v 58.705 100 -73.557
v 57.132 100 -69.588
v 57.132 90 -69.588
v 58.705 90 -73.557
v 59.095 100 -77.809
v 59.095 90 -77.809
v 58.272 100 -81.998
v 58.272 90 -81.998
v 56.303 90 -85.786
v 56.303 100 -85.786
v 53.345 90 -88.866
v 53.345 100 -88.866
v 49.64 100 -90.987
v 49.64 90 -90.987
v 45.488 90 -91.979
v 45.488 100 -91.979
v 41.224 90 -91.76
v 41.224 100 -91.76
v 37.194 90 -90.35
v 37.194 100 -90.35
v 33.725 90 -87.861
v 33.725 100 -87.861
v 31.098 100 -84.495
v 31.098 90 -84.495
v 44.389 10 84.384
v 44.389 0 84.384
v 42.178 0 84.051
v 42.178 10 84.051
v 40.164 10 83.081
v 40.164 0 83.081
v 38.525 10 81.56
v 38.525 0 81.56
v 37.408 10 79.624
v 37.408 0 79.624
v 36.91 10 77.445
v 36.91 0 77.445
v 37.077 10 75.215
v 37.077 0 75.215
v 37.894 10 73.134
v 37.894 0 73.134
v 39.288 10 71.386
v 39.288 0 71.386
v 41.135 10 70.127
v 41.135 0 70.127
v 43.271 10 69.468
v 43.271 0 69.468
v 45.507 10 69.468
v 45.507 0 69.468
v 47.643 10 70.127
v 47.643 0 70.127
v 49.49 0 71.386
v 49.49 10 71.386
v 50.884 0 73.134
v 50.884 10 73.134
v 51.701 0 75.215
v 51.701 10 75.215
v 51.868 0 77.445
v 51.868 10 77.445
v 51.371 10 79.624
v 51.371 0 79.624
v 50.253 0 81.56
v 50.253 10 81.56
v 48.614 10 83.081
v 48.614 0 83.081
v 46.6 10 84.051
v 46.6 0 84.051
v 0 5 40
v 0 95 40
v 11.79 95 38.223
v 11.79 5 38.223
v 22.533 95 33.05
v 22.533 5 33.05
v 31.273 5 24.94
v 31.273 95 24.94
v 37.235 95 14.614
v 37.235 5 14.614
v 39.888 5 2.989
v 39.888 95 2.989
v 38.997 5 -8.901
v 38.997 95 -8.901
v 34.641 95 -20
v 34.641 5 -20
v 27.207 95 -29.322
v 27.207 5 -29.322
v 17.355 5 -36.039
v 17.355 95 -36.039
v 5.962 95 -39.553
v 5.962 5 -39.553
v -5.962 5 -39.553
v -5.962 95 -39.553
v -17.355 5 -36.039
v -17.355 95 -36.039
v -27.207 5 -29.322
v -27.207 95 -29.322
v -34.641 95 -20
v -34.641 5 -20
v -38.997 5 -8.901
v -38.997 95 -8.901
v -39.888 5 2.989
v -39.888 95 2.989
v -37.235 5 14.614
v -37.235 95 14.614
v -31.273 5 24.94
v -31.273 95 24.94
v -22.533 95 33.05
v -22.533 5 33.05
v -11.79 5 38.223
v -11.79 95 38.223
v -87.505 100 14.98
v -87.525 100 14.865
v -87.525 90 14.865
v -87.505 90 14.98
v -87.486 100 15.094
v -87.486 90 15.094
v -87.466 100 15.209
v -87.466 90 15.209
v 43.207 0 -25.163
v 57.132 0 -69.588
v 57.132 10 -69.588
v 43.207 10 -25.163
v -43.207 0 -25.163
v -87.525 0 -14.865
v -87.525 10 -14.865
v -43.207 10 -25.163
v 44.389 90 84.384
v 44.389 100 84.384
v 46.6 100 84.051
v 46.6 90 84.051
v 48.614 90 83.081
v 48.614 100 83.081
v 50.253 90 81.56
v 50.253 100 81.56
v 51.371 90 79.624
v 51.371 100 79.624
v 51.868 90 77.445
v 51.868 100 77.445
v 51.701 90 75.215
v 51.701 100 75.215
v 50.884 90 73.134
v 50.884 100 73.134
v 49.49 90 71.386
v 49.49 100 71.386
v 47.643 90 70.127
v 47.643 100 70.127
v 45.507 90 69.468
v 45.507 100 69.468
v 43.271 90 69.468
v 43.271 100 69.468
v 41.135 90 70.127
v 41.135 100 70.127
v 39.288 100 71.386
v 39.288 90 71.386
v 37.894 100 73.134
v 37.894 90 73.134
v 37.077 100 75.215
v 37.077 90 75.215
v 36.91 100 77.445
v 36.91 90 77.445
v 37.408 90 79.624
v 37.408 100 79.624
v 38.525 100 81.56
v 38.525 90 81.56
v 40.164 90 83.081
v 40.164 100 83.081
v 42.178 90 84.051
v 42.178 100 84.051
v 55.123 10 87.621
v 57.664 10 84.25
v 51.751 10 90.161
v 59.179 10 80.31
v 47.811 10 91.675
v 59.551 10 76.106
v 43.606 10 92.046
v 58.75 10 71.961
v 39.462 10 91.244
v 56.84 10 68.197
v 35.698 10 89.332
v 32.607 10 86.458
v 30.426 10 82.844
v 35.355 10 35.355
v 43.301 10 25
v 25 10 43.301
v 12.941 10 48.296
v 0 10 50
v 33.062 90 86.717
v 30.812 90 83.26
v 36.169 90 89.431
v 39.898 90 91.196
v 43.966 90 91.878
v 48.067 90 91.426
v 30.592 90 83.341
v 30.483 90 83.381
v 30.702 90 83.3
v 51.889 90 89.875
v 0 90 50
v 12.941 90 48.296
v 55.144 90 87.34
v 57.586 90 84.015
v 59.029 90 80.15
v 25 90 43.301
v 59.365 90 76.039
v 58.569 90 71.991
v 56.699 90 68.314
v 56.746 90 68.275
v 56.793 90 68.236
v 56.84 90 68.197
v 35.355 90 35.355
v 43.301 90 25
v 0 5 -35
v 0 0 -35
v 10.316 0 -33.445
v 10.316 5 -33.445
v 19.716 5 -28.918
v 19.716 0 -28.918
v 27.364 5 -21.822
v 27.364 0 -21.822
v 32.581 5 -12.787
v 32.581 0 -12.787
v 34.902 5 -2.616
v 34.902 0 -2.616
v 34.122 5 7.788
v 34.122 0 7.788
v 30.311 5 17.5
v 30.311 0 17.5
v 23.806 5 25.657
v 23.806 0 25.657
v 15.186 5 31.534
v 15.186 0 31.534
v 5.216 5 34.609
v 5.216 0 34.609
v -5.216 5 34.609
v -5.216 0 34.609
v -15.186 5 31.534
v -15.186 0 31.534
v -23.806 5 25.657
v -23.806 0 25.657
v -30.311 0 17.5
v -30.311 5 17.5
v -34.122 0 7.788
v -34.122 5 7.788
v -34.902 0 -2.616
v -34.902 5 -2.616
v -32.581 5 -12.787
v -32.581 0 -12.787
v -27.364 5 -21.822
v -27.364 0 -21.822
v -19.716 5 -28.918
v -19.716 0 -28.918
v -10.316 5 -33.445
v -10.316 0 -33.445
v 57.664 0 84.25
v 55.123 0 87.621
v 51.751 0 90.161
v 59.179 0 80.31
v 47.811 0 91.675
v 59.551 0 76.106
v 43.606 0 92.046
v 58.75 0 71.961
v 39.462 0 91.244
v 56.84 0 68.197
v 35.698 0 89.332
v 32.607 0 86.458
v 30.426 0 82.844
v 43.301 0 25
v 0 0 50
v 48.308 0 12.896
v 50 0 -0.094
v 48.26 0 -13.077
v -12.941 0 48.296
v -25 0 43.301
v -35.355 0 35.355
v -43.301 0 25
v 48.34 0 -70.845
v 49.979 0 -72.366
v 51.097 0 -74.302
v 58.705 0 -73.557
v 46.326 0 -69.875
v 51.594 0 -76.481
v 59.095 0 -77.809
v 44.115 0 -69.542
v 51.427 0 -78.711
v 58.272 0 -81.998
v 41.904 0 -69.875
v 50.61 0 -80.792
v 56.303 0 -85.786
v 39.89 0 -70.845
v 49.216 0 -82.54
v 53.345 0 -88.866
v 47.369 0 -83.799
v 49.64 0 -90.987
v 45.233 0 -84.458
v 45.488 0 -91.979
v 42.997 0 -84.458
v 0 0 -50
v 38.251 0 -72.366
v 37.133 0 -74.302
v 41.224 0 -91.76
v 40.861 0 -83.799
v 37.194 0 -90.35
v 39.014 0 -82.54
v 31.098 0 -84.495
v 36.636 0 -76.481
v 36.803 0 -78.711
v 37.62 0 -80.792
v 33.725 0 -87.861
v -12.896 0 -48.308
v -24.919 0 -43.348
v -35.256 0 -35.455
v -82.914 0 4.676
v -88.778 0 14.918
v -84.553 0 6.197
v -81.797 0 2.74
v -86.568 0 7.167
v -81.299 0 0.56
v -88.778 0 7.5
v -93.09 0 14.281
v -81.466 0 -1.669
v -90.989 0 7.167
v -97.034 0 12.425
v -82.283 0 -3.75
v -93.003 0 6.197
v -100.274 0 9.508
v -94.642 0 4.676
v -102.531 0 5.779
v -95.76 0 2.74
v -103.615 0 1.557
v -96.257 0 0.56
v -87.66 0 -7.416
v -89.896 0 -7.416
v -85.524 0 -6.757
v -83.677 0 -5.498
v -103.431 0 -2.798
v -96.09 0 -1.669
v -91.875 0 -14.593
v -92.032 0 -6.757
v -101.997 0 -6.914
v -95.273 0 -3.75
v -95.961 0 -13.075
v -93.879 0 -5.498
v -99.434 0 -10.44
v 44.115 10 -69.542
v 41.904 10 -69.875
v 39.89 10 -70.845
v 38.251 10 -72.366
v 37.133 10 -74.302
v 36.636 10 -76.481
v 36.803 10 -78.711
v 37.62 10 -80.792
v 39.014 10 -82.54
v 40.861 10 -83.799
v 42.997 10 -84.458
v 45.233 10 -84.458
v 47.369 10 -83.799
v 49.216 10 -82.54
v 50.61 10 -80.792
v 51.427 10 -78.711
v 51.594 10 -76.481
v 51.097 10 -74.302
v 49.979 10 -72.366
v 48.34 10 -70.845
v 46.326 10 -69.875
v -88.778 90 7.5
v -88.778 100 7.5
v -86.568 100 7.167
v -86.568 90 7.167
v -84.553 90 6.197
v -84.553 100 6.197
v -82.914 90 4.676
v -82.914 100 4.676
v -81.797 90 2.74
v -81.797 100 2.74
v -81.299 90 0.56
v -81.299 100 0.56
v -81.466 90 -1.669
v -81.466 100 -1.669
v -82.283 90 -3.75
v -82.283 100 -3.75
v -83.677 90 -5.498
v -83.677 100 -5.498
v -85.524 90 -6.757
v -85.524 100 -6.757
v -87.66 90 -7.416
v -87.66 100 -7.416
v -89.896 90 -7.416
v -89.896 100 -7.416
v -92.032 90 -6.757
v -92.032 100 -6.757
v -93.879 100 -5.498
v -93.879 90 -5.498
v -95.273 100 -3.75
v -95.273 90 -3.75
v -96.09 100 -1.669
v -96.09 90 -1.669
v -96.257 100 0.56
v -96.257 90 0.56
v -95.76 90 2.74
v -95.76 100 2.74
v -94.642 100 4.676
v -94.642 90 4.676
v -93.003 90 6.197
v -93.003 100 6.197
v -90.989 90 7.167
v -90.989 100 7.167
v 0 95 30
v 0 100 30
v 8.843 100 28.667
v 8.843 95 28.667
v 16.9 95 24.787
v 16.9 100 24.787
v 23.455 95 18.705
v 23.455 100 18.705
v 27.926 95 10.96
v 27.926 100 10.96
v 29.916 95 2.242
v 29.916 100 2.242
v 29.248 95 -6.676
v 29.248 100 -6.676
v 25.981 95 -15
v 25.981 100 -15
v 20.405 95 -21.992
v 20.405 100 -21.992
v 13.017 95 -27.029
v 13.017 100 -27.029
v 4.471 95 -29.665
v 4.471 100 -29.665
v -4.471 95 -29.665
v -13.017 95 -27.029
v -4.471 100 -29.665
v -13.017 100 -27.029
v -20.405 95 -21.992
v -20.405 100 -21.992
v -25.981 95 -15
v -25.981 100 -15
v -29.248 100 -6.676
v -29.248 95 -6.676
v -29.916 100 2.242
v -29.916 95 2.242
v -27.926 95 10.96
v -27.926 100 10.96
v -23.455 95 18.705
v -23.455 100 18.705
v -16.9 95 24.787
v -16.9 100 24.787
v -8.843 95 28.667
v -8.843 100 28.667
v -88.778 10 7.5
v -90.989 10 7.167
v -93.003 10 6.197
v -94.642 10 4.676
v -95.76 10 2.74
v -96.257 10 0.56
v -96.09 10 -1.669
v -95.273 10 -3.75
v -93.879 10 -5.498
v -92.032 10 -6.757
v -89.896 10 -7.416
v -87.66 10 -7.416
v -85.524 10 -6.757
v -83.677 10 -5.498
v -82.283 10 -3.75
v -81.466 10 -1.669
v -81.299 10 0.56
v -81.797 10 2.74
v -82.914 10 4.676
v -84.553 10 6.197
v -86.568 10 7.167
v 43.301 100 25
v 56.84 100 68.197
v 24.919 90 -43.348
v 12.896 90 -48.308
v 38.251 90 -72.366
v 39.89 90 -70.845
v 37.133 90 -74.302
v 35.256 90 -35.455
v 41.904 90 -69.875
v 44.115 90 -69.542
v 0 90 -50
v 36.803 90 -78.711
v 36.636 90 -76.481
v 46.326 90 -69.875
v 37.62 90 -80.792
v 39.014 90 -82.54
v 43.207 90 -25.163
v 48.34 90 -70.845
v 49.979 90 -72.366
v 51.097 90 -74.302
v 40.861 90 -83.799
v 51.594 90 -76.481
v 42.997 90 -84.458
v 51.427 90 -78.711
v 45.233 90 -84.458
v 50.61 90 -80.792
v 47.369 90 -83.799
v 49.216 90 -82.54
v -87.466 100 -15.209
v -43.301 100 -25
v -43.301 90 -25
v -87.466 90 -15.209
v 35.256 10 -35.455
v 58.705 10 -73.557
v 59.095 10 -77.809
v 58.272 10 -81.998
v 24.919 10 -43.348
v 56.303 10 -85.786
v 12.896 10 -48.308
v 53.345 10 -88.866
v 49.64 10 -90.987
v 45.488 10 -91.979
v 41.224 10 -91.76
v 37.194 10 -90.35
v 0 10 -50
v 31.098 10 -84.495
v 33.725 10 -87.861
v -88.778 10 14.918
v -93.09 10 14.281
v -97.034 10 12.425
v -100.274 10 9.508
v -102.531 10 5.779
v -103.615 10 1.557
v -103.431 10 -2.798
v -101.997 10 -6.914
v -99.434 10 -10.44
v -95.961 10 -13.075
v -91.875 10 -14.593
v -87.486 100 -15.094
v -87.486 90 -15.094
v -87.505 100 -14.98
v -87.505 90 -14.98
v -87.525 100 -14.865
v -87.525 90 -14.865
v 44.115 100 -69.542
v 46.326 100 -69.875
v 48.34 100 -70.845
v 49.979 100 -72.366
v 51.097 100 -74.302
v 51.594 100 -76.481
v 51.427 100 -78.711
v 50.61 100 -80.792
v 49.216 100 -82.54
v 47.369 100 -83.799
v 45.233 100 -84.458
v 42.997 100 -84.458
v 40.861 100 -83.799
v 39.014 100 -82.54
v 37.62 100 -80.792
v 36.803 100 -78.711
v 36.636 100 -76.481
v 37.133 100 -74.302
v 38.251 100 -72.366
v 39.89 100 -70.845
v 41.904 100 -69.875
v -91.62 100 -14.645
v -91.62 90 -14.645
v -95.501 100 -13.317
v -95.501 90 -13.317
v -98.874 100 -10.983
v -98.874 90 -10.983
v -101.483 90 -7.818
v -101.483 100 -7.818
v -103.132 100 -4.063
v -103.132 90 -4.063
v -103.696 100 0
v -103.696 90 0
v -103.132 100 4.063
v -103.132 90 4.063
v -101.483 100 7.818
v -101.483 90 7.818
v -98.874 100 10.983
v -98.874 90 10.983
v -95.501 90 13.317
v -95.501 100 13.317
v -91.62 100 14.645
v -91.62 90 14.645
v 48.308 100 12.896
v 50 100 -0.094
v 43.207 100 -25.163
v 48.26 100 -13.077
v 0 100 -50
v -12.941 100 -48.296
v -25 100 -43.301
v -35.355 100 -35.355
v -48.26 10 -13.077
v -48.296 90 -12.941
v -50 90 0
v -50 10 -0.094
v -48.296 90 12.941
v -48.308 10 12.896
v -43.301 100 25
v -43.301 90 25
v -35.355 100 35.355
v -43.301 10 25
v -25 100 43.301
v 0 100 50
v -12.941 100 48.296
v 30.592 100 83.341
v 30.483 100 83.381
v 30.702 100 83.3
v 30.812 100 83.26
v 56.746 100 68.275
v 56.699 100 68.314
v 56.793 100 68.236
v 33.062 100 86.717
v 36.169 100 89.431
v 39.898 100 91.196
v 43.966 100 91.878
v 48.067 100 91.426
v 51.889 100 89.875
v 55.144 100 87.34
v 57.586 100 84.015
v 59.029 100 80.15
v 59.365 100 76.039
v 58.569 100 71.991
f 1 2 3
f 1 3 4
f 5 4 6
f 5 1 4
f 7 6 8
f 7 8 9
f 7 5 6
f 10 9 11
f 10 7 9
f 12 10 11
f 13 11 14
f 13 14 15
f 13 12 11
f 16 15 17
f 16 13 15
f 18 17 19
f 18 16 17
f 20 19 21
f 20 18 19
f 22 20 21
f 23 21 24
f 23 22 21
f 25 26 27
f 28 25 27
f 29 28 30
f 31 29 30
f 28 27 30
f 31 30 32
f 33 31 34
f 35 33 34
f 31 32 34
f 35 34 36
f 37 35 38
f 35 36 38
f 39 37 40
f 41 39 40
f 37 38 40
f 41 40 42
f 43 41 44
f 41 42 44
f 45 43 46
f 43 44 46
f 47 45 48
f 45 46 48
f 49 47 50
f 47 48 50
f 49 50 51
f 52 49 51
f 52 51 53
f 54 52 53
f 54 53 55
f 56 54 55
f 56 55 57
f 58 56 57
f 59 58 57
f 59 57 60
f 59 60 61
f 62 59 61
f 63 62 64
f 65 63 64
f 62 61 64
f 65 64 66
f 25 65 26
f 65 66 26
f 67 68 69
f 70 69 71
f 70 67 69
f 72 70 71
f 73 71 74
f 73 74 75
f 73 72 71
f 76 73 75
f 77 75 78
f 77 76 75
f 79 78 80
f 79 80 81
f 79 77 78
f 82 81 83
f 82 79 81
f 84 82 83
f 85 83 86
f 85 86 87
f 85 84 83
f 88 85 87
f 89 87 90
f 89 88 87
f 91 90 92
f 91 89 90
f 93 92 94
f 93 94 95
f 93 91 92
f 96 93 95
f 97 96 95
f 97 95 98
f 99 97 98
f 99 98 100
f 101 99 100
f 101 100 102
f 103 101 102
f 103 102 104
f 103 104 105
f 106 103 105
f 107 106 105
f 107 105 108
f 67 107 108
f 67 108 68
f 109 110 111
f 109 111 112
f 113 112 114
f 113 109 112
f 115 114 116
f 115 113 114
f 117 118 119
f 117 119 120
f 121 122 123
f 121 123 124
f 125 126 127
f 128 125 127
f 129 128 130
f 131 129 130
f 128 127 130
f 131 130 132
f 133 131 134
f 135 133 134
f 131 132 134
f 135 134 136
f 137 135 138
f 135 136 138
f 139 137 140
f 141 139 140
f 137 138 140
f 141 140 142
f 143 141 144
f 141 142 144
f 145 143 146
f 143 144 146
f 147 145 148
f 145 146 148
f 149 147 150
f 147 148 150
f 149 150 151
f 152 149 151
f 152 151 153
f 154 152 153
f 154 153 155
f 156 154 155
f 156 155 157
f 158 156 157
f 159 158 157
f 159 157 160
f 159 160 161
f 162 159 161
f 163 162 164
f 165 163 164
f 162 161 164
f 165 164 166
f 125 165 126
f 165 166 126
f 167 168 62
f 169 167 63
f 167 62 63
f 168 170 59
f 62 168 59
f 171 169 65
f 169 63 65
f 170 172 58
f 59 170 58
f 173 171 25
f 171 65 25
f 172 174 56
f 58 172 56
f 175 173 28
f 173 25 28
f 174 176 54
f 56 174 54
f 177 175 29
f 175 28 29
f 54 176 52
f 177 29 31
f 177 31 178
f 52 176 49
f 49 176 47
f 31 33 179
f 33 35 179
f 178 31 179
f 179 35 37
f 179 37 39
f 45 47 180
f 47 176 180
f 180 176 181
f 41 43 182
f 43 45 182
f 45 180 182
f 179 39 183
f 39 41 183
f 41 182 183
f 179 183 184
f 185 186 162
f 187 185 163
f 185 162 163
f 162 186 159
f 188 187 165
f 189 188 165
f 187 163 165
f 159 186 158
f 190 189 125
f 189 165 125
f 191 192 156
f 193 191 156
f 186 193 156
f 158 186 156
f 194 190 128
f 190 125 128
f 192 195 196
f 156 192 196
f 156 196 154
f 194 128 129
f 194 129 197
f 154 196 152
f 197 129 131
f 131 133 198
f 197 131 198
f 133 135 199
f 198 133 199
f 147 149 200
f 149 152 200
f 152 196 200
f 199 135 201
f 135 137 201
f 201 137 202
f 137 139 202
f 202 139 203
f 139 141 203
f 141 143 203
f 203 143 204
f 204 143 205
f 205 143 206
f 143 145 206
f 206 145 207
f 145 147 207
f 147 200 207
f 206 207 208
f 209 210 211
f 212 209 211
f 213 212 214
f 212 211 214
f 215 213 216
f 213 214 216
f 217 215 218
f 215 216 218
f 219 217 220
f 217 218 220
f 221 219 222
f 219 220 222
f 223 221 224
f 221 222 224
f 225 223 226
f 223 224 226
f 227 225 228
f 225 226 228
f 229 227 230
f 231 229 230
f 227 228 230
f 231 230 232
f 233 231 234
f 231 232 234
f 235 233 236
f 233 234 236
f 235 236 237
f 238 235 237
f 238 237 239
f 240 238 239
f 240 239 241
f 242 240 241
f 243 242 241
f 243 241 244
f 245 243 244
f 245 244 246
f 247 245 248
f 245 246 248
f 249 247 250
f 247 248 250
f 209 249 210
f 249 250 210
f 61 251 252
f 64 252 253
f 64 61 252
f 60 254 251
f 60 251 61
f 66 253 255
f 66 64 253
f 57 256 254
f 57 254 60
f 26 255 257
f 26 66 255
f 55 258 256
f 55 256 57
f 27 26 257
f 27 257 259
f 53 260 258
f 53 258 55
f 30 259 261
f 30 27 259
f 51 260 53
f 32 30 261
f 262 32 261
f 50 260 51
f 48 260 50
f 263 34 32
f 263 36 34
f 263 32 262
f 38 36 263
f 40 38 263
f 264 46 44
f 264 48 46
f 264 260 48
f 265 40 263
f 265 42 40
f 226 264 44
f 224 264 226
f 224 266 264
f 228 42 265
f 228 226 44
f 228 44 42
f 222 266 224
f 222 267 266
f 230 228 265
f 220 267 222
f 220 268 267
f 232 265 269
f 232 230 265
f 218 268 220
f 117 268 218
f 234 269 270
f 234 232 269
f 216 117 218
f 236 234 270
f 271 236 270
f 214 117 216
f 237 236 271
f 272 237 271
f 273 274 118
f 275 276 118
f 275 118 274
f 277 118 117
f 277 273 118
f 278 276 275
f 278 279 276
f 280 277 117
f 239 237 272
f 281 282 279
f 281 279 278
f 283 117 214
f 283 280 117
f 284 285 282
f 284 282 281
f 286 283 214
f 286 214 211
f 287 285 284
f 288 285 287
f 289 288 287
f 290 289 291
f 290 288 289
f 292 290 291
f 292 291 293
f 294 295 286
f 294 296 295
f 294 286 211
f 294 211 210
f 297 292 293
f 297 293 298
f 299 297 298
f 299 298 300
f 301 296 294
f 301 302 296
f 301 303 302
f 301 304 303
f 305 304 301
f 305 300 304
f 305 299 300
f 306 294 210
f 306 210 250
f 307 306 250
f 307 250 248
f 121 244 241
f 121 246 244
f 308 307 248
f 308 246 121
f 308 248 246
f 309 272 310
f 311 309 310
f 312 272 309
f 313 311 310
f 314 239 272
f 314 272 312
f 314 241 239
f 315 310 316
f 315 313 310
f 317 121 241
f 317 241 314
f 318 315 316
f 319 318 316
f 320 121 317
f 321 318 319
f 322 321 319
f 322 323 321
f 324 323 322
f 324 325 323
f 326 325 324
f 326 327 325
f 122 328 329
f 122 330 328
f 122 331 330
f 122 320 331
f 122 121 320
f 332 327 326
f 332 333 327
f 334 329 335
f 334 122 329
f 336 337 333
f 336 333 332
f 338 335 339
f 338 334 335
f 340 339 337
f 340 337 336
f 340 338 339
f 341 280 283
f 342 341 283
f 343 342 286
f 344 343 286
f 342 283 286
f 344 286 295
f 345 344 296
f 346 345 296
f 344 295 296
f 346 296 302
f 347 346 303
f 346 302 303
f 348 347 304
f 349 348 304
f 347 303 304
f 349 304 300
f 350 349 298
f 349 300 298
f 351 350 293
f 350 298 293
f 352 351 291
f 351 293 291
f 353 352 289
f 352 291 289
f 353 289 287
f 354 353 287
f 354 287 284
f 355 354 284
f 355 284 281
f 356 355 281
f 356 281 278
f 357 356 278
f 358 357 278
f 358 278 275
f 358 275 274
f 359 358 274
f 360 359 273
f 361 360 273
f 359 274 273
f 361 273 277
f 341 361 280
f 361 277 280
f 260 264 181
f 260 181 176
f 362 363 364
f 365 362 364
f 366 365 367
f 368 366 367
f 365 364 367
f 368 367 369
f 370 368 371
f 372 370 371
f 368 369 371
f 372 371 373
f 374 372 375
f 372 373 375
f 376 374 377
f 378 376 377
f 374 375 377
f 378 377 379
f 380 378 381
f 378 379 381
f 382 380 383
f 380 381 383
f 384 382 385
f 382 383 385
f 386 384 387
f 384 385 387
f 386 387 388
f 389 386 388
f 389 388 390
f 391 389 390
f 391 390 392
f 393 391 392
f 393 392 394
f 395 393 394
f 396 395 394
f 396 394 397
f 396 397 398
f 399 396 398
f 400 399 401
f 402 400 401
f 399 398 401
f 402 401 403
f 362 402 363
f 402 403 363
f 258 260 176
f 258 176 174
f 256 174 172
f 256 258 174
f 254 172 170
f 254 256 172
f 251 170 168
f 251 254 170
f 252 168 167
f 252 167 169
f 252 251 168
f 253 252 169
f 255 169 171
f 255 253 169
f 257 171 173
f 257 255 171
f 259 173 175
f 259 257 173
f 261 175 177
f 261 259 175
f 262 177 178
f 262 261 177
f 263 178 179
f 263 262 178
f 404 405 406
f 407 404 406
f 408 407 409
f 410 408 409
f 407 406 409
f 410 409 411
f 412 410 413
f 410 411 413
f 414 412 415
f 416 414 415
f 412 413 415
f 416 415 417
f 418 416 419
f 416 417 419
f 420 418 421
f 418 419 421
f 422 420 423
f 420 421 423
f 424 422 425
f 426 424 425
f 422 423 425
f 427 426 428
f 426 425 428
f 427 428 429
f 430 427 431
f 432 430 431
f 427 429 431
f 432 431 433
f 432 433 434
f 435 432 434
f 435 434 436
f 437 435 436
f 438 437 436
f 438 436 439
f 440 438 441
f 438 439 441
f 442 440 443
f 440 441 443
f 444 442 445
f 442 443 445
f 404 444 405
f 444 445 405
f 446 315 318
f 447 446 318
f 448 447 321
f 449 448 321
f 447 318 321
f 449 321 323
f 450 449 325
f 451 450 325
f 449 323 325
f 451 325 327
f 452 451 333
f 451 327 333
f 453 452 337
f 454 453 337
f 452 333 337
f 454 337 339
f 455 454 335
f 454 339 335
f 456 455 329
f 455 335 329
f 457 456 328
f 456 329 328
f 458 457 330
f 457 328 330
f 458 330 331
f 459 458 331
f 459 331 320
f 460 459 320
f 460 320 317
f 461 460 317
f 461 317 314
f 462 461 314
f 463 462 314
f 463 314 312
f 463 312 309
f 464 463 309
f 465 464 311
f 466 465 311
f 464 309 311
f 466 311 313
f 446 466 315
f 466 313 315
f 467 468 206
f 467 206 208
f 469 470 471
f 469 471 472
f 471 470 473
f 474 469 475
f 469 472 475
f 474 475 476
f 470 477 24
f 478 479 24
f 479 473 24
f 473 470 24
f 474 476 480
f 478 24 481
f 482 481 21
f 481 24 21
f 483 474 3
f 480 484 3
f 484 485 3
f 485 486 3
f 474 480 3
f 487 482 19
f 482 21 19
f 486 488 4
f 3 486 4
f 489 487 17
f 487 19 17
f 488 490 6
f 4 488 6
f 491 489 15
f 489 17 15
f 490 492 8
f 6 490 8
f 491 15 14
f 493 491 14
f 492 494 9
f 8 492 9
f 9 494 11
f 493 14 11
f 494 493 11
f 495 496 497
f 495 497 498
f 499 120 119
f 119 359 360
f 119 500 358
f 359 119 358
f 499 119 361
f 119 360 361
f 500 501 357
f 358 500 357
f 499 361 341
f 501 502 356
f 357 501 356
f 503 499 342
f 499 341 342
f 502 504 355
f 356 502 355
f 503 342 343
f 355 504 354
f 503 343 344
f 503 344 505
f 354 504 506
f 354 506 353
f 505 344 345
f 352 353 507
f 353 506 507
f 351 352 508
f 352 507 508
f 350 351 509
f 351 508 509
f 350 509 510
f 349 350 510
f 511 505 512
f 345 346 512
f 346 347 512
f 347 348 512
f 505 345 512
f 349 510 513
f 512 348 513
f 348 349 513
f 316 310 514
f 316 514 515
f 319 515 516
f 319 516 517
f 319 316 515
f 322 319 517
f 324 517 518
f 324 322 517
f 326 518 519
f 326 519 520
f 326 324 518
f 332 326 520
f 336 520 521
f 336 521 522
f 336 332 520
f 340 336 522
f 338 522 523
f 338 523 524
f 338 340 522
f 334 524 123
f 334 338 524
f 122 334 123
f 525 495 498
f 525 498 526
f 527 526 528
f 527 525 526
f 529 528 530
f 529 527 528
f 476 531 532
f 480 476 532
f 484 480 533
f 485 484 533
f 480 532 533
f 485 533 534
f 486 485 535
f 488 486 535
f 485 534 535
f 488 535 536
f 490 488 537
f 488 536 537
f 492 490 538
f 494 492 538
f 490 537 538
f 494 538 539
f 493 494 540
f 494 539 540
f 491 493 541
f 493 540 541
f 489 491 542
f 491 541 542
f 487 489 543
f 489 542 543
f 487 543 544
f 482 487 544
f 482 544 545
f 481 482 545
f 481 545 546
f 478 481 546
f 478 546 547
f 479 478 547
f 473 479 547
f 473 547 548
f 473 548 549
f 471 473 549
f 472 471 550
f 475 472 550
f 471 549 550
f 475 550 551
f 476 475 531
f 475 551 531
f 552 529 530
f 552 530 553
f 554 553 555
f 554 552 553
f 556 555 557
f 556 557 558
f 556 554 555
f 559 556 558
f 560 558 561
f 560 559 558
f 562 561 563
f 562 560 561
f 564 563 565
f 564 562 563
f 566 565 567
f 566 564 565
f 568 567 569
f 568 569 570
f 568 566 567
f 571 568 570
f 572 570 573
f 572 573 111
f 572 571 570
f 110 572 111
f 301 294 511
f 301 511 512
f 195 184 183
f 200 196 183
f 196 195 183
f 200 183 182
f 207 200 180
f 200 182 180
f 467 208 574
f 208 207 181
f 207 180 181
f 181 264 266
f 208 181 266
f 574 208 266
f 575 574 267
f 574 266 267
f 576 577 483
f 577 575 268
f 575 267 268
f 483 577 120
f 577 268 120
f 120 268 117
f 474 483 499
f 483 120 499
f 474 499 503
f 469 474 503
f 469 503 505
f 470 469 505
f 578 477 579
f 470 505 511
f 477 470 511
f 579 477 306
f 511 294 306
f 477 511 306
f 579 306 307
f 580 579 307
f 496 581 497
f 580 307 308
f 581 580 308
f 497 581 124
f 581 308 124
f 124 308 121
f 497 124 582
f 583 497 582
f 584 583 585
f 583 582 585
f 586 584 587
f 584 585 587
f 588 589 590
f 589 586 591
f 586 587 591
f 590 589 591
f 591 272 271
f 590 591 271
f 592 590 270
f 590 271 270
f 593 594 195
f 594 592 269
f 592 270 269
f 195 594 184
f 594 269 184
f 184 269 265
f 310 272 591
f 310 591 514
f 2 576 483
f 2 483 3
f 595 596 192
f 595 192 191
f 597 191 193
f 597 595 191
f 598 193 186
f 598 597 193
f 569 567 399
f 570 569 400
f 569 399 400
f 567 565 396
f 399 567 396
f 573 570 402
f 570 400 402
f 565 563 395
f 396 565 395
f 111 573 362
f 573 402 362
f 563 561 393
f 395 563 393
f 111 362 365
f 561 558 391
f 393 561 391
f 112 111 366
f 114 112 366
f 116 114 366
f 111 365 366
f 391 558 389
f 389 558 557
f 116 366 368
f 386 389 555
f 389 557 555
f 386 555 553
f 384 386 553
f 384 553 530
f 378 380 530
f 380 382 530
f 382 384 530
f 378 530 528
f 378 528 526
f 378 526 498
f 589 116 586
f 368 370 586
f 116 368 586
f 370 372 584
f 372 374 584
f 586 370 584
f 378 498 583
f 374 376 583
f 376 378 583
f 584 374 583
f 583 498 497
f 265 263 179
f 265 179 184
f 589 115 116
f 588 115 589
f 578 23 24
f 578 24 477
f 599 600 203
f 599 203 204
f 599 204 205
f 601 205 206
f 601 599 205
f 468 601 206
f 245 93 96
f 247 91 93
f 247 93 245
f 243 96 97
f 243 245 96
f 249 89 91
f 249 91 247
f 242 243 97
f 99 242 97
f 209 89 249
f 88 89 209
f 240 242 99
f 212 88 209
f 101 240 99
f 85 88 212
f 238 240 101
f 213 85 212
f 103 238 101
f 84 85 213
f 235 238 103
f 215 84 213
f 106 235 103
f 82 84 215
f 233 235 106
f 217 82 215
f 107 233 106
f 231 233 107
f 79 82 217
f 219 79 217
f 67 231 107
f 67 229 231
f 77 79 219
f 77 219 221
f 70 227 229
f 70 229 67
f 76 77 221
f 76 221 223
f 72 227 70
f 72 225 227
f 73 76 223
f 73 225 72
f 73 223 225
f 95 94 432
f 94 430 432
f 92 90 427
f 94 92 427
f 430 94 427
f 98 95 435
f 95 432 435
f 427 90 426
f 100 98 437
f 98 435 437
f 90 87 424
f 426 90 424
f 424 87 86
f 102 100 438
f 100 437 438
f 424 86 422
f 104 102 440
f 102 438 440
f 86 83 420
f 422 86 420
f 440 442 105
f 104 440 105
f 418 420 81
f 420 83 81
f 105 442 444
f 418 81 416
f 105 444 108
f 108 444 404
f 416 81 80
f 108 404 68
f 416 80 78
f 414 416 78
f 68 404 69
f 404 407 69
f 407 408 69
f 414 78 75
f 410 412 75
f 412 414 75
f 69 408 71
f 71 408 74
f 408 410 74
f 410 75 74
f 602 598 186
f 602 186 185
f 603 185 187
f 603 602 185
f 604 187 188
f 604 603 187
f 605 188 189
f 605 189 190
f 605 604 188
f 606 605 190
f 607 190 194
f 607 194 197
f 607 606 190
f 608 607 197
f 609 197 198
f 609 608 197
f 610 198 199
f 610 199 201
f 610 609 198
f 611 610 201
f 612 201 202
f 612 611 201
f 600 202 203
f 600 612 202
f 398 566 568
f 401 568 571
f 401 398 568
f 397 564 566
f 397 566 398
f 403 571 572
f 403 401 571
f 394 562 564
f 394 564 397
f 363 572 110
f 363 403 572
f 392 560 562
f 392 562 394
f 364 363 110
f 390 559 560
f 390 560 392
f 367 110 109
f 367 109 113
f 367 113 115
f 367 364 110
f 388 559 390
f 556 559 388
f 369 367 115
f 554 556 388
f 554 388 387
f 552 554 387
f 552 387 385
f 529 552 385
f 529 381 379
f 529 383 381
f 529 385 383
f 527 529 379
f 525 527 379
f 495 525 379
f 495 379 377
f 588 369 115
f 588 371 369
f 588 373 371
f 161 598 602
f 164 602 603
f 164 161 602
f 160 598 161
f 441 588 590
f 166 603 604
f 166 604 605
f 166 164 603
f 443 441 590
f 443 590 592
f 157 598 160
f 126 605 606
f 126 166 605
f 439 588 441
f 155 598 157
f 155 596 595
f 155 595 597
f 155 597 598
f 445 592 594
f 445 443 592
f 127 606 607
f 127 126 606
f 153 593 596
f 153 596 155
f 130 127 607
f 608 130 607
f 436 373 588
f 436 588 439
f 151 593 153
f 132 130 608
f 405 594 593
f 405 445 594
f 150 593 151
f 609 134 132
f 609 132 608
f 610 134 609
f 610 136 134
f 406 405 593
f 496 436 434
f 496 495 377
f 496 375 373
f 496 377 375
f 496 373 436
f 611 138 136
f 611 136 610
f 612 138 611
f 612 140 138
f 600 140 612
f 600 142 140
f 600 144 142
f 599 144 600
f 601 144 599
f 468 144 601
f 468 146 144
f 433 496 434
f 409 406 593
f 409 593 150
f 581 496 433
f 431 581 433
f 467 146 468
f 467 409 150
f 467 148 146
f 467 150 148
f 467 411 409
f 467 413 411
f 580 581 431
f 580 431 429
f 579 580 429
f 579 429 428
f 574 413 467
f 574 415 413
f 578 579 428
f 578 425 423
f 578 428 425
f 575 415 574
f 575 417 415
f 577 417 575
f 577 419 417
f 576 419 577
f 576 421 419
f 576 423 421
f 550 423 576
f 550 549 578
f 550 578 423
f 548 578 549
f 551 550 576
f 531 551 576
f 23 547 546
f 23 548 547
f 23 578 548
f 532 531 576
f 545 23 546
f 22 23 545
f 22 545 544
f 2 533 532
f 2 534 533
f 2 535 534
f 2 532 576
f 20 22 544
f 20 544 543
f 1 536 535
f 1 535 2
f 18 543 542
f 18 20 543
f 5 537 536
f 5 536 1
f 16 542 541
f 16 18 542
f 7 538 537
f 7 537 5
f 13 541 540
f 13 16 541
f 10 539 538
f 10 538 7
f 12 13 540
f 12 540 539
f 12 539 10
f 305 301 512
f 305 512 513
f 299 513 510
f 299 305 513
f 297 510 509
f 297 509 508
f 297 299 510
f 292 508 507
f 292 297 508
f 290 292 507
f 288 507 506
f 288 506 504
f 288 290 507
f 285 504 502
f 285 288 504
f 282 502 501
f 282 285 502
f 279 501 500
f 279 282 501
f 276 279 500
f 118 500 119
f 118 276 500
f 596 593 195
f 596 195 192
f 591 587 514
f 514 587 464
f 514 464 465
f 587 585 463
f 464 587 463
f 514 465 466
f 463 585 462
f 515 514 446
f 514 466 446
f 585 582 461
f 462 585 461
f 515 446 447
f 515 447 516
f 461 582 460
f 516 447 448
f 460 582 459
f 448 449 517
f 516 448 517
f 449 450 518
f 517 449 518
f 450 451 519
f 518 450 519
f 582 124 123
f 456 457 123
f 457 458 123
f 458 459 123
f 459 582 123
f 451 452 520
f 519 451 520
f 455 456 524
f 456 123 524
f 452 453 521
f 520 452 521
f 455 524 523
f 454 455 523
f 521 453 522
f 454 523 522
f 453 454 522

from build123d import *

# Parameters (mm, degrees)
SKETCH1_R            = 50
SKETCH1_R_2          = 40
BOSS_EXTRUDE2_DEPTH  = 100
SKETCH4_R            = 40
SKETCH4_R_2          = 30
BOSS_EXTRUDE5_DEPTH  = 5
SKETCH2_R            = 40
BOSS_EXTRUDE6_DEPTH  = 5
SKETCH5_R            = 35
CUT_EXTRUDE1_DEPTH   = 5
SKETCH8_R            = 15
SKETCH8_R_2          = 7.5
SKETCH8_R_3          = 14.918013771
BOSS_EXTRUDE9_DEPTH  = 10
BOSS_EXTRUDE13_DEPTH = 10
SKETCH18_R           = 7.5
CUT_EXTRUDE5_DEPTH   = 10


with BuildPart() as part:
    # Sketch1 → Boss-Extrude2 (new body)
    with BuildSketch(Plane(origin=(0, 0, 0), x_dir=(1, 0, 0), z_dir=(0, 1, 0))):
        with Locations(Location((0, 0, 0), (0, 0, 270))):
            Circle(SKETCH1_R)
        with Locations(Location((0, 0, 0), (0, 0, 270))):
            Circle(SKETCH1_R_2, mode=Mode.SUBTRACT)
    extrude(amount=BOSS_EXTRUDE2_DEPTH)

    # Sketch4 → Boss-Extrude5 (add)
    with BuildSketch(Plane(origin=(0, 100, 0), x_dir=(1, 0, 0), z_dir=(0, 1, 0))):
        with Locations(Location((0, 0, 0), (0, 0, 270))):
            Circle(SKETCH4_R)
        with Locations(Location((0, 0, 0), (0, 0, 270))):
            Circle(SKETCH4_R_2, mode=Mode.SUBTRACT)
    extrude(amount=-BOSS_EXTRUDE5_DEPTH)

    # Sketch2 → Boss-Extrude6 (add)
    with BuildSketch(Plane(origin=(0, 0, 0), x_dir=(1, 0, 0), z_dir=(0, 1, 0))):
        with Locations(Location((0, 0, 0), (0, 0, 270))):
            Circle(SKETCH2_R)
    extrude(amount=BOSS_EXTRUDE6_DEPTH)

    # Sketch5 → Cut-Extrude1 (cut)
    with BuildSketch(Plane.XZ):
        with Locations(Location((0, 0, 0), (0, 0, 270))):
            Circle(SKETCH5_R)
    extrude(amount=-CUT_EXTRUDE1_DEPTH, mode=Mode.SUBTRACT)

    # Sketch8 → Boss-Extrude9 (add)
    with BuildSketch(Plane(origin=(0, 100, 0), x_dir=(1, 0, 0), z_dir=(0, 1, 0))):
        with BuildLine():
            ThreePointArc((-43.301270189, -25), (-50, 0), (-43.301270189, 25))
            Line((-43.301270189, 25), (-87.465711201, 15.208979149))
            ThreePointArc((-87.465711201, 15.208979149), (-87.49541557, 15.037151885), (-87.524782384, 14.865266608))
            ThreePointArc((-87.524782384, 14.865266608), (-77.795338999, 10.095768004), (-73.860157435, 0))
            ThreePointArc((-73.860157435, 0), (-77.795338999, -10.095768004), (-87.524782384, -14.865266608))
            ThreePointArc((-87.524782384, -14.865266608), (-87.49541557, -15.037151885), (-87.465711201, -15.208979149))
            Line((-87.465711201, -15.208979149), (-43.301270189, -25))
        make_face()
        with BuildLine():
            ThreePointArc((0, 50), (24.918582465, 43.348174678), (43.207002617, 25.162569917))
            Line((43.207002617, 25.162569917), (57.131969376, 69.588086322))
            ThreePointArc((57.131969376, 69.588086322), (36.661274001, 64.024757205), (31.097944884, 84.49545258))
            Line((31.097944884, 84.49545258), (0, 50))
        make_face()
        with Locations((44.11495713, 77.041769451)):
            Circle(SKETCH8_R)
        with Locations(Location((44.11495713, 77.041769451, 0), (0, 0, 270))):
            Circle(SKETCH8_R_2, mode=Mode.SUBTRACT)
        with Locations((44.389085603, -76.884151566)):
            Circle(SKETCH8_R)
        with Locations(Location((44.389085603, -76.884151566, 0), (0, 0, 270))):
            Circle(SKETCH8_R_2, mode=Mode.SUBTRACT)
        with BuildLine():
            Line((56.839616952, -68.196932683), (43.301270189, -25))
            ThreePointArc((43.301270189, -25), (25, -43.301270189), (0, -50))
            Line((0, -50), (30.482572388, -83.380911864))
            ThreePointArc((30.482572388, -83.380911864), (30.64711663, -83.32057324), (30.811541435, -83.259909903))
            ThreePointArc((30.811541435, -83.259909903), (36.889085603, -63.893770509), (56.699426375, -68.313532564))
            ThreePointArc((56.699426375, -68.313532564), (56.7695516, -68.255268616), (56.839616952, -68.196932683))
        make_face()
        with Locations((-88.778171206, 0)):
            Circle(SKETCH8_R_3)
        with Locations(Location((-88.778171206, 0, 0), (0, 0, 270))):
            Circle(SKETCH8_R_2, mode=Mode.SUBTRACT)
    extrude(amount=-BOSS_EXTRUDE9_DEPTH)

    # Sketch17 → Boss-Extrude13 (add)
    with BuildSketch(Plane(origin=(0, 0, 0), x_dir=(-1, 0, 0), z_dir=(0, -1, 0))):
        with BuildLine():
            Line((43.301270189, -25), (88.778171206, -14.918013771))
            ThreePointArc((88.778171206, -14.918013771), (103.682992353, 0.627249114), (87.524782384, 14.865266608))
            Line((87.524782384, 14.865266608), (43.207002617, 25.162569917))
            ThreePointArc((43.207002617, 25.162569917), (49.999911712, 0.093961898), (43.301270189, -25))
        make_face()
        with BuildLine():
            ThreePointArc((-43.207002617, 25.162569917), (-24.918582465, 43.348174678), (0, 50))
            Line((0, 50), (-31.097944884, 84.49545258))
            ThreePointArc((-31.097944884, 84.49545258), (-51.568640259, 90.058781697), (-57.131969376, 69.588086322))
            Line((-57.131969376, 69.588086322), (-43.207002617, 25.162569917))
        make_face()
        with BuildLine():
            Line((-30.426057059, -82.843793895), (0, -50))
            ThreePointArc((0, -50), (-25, -43.301270189), (-43.301270189, -25))
            Line((-43.301270189, -25), (-56.839616952, -68.196932683))
            ThreePointArc((-56.839616952, -68.196932683), (-51.75145939, -90.161160078), (-30.426057059, -82.843793895))
        make_face()
    extrude(amount=-BOSS_EXTRUDE13_DEPTH)

    # Sketch18 → Cut-Extrude5 (cut)
    with BuildSketch(Plane.XZ):
        with Locations(Location((-88.778171206, 0, 0), (0, 0, 90))):
            Circle(SKETCH18_R)
        with Locations(Location((44.389085603, 76.884151566, 0), (0, 0, 90))):
            Circle(SKETCH18_R)
        with Locations(Location((44.11495713, -77.041769451, 0), (0, 0, 90))):
            Circle(SKETCH18_R)
    extrude(amount=-CUT_EXTRUDE5_DEPTH, mode=Mode.SUBTRACT)


solid = part.part
